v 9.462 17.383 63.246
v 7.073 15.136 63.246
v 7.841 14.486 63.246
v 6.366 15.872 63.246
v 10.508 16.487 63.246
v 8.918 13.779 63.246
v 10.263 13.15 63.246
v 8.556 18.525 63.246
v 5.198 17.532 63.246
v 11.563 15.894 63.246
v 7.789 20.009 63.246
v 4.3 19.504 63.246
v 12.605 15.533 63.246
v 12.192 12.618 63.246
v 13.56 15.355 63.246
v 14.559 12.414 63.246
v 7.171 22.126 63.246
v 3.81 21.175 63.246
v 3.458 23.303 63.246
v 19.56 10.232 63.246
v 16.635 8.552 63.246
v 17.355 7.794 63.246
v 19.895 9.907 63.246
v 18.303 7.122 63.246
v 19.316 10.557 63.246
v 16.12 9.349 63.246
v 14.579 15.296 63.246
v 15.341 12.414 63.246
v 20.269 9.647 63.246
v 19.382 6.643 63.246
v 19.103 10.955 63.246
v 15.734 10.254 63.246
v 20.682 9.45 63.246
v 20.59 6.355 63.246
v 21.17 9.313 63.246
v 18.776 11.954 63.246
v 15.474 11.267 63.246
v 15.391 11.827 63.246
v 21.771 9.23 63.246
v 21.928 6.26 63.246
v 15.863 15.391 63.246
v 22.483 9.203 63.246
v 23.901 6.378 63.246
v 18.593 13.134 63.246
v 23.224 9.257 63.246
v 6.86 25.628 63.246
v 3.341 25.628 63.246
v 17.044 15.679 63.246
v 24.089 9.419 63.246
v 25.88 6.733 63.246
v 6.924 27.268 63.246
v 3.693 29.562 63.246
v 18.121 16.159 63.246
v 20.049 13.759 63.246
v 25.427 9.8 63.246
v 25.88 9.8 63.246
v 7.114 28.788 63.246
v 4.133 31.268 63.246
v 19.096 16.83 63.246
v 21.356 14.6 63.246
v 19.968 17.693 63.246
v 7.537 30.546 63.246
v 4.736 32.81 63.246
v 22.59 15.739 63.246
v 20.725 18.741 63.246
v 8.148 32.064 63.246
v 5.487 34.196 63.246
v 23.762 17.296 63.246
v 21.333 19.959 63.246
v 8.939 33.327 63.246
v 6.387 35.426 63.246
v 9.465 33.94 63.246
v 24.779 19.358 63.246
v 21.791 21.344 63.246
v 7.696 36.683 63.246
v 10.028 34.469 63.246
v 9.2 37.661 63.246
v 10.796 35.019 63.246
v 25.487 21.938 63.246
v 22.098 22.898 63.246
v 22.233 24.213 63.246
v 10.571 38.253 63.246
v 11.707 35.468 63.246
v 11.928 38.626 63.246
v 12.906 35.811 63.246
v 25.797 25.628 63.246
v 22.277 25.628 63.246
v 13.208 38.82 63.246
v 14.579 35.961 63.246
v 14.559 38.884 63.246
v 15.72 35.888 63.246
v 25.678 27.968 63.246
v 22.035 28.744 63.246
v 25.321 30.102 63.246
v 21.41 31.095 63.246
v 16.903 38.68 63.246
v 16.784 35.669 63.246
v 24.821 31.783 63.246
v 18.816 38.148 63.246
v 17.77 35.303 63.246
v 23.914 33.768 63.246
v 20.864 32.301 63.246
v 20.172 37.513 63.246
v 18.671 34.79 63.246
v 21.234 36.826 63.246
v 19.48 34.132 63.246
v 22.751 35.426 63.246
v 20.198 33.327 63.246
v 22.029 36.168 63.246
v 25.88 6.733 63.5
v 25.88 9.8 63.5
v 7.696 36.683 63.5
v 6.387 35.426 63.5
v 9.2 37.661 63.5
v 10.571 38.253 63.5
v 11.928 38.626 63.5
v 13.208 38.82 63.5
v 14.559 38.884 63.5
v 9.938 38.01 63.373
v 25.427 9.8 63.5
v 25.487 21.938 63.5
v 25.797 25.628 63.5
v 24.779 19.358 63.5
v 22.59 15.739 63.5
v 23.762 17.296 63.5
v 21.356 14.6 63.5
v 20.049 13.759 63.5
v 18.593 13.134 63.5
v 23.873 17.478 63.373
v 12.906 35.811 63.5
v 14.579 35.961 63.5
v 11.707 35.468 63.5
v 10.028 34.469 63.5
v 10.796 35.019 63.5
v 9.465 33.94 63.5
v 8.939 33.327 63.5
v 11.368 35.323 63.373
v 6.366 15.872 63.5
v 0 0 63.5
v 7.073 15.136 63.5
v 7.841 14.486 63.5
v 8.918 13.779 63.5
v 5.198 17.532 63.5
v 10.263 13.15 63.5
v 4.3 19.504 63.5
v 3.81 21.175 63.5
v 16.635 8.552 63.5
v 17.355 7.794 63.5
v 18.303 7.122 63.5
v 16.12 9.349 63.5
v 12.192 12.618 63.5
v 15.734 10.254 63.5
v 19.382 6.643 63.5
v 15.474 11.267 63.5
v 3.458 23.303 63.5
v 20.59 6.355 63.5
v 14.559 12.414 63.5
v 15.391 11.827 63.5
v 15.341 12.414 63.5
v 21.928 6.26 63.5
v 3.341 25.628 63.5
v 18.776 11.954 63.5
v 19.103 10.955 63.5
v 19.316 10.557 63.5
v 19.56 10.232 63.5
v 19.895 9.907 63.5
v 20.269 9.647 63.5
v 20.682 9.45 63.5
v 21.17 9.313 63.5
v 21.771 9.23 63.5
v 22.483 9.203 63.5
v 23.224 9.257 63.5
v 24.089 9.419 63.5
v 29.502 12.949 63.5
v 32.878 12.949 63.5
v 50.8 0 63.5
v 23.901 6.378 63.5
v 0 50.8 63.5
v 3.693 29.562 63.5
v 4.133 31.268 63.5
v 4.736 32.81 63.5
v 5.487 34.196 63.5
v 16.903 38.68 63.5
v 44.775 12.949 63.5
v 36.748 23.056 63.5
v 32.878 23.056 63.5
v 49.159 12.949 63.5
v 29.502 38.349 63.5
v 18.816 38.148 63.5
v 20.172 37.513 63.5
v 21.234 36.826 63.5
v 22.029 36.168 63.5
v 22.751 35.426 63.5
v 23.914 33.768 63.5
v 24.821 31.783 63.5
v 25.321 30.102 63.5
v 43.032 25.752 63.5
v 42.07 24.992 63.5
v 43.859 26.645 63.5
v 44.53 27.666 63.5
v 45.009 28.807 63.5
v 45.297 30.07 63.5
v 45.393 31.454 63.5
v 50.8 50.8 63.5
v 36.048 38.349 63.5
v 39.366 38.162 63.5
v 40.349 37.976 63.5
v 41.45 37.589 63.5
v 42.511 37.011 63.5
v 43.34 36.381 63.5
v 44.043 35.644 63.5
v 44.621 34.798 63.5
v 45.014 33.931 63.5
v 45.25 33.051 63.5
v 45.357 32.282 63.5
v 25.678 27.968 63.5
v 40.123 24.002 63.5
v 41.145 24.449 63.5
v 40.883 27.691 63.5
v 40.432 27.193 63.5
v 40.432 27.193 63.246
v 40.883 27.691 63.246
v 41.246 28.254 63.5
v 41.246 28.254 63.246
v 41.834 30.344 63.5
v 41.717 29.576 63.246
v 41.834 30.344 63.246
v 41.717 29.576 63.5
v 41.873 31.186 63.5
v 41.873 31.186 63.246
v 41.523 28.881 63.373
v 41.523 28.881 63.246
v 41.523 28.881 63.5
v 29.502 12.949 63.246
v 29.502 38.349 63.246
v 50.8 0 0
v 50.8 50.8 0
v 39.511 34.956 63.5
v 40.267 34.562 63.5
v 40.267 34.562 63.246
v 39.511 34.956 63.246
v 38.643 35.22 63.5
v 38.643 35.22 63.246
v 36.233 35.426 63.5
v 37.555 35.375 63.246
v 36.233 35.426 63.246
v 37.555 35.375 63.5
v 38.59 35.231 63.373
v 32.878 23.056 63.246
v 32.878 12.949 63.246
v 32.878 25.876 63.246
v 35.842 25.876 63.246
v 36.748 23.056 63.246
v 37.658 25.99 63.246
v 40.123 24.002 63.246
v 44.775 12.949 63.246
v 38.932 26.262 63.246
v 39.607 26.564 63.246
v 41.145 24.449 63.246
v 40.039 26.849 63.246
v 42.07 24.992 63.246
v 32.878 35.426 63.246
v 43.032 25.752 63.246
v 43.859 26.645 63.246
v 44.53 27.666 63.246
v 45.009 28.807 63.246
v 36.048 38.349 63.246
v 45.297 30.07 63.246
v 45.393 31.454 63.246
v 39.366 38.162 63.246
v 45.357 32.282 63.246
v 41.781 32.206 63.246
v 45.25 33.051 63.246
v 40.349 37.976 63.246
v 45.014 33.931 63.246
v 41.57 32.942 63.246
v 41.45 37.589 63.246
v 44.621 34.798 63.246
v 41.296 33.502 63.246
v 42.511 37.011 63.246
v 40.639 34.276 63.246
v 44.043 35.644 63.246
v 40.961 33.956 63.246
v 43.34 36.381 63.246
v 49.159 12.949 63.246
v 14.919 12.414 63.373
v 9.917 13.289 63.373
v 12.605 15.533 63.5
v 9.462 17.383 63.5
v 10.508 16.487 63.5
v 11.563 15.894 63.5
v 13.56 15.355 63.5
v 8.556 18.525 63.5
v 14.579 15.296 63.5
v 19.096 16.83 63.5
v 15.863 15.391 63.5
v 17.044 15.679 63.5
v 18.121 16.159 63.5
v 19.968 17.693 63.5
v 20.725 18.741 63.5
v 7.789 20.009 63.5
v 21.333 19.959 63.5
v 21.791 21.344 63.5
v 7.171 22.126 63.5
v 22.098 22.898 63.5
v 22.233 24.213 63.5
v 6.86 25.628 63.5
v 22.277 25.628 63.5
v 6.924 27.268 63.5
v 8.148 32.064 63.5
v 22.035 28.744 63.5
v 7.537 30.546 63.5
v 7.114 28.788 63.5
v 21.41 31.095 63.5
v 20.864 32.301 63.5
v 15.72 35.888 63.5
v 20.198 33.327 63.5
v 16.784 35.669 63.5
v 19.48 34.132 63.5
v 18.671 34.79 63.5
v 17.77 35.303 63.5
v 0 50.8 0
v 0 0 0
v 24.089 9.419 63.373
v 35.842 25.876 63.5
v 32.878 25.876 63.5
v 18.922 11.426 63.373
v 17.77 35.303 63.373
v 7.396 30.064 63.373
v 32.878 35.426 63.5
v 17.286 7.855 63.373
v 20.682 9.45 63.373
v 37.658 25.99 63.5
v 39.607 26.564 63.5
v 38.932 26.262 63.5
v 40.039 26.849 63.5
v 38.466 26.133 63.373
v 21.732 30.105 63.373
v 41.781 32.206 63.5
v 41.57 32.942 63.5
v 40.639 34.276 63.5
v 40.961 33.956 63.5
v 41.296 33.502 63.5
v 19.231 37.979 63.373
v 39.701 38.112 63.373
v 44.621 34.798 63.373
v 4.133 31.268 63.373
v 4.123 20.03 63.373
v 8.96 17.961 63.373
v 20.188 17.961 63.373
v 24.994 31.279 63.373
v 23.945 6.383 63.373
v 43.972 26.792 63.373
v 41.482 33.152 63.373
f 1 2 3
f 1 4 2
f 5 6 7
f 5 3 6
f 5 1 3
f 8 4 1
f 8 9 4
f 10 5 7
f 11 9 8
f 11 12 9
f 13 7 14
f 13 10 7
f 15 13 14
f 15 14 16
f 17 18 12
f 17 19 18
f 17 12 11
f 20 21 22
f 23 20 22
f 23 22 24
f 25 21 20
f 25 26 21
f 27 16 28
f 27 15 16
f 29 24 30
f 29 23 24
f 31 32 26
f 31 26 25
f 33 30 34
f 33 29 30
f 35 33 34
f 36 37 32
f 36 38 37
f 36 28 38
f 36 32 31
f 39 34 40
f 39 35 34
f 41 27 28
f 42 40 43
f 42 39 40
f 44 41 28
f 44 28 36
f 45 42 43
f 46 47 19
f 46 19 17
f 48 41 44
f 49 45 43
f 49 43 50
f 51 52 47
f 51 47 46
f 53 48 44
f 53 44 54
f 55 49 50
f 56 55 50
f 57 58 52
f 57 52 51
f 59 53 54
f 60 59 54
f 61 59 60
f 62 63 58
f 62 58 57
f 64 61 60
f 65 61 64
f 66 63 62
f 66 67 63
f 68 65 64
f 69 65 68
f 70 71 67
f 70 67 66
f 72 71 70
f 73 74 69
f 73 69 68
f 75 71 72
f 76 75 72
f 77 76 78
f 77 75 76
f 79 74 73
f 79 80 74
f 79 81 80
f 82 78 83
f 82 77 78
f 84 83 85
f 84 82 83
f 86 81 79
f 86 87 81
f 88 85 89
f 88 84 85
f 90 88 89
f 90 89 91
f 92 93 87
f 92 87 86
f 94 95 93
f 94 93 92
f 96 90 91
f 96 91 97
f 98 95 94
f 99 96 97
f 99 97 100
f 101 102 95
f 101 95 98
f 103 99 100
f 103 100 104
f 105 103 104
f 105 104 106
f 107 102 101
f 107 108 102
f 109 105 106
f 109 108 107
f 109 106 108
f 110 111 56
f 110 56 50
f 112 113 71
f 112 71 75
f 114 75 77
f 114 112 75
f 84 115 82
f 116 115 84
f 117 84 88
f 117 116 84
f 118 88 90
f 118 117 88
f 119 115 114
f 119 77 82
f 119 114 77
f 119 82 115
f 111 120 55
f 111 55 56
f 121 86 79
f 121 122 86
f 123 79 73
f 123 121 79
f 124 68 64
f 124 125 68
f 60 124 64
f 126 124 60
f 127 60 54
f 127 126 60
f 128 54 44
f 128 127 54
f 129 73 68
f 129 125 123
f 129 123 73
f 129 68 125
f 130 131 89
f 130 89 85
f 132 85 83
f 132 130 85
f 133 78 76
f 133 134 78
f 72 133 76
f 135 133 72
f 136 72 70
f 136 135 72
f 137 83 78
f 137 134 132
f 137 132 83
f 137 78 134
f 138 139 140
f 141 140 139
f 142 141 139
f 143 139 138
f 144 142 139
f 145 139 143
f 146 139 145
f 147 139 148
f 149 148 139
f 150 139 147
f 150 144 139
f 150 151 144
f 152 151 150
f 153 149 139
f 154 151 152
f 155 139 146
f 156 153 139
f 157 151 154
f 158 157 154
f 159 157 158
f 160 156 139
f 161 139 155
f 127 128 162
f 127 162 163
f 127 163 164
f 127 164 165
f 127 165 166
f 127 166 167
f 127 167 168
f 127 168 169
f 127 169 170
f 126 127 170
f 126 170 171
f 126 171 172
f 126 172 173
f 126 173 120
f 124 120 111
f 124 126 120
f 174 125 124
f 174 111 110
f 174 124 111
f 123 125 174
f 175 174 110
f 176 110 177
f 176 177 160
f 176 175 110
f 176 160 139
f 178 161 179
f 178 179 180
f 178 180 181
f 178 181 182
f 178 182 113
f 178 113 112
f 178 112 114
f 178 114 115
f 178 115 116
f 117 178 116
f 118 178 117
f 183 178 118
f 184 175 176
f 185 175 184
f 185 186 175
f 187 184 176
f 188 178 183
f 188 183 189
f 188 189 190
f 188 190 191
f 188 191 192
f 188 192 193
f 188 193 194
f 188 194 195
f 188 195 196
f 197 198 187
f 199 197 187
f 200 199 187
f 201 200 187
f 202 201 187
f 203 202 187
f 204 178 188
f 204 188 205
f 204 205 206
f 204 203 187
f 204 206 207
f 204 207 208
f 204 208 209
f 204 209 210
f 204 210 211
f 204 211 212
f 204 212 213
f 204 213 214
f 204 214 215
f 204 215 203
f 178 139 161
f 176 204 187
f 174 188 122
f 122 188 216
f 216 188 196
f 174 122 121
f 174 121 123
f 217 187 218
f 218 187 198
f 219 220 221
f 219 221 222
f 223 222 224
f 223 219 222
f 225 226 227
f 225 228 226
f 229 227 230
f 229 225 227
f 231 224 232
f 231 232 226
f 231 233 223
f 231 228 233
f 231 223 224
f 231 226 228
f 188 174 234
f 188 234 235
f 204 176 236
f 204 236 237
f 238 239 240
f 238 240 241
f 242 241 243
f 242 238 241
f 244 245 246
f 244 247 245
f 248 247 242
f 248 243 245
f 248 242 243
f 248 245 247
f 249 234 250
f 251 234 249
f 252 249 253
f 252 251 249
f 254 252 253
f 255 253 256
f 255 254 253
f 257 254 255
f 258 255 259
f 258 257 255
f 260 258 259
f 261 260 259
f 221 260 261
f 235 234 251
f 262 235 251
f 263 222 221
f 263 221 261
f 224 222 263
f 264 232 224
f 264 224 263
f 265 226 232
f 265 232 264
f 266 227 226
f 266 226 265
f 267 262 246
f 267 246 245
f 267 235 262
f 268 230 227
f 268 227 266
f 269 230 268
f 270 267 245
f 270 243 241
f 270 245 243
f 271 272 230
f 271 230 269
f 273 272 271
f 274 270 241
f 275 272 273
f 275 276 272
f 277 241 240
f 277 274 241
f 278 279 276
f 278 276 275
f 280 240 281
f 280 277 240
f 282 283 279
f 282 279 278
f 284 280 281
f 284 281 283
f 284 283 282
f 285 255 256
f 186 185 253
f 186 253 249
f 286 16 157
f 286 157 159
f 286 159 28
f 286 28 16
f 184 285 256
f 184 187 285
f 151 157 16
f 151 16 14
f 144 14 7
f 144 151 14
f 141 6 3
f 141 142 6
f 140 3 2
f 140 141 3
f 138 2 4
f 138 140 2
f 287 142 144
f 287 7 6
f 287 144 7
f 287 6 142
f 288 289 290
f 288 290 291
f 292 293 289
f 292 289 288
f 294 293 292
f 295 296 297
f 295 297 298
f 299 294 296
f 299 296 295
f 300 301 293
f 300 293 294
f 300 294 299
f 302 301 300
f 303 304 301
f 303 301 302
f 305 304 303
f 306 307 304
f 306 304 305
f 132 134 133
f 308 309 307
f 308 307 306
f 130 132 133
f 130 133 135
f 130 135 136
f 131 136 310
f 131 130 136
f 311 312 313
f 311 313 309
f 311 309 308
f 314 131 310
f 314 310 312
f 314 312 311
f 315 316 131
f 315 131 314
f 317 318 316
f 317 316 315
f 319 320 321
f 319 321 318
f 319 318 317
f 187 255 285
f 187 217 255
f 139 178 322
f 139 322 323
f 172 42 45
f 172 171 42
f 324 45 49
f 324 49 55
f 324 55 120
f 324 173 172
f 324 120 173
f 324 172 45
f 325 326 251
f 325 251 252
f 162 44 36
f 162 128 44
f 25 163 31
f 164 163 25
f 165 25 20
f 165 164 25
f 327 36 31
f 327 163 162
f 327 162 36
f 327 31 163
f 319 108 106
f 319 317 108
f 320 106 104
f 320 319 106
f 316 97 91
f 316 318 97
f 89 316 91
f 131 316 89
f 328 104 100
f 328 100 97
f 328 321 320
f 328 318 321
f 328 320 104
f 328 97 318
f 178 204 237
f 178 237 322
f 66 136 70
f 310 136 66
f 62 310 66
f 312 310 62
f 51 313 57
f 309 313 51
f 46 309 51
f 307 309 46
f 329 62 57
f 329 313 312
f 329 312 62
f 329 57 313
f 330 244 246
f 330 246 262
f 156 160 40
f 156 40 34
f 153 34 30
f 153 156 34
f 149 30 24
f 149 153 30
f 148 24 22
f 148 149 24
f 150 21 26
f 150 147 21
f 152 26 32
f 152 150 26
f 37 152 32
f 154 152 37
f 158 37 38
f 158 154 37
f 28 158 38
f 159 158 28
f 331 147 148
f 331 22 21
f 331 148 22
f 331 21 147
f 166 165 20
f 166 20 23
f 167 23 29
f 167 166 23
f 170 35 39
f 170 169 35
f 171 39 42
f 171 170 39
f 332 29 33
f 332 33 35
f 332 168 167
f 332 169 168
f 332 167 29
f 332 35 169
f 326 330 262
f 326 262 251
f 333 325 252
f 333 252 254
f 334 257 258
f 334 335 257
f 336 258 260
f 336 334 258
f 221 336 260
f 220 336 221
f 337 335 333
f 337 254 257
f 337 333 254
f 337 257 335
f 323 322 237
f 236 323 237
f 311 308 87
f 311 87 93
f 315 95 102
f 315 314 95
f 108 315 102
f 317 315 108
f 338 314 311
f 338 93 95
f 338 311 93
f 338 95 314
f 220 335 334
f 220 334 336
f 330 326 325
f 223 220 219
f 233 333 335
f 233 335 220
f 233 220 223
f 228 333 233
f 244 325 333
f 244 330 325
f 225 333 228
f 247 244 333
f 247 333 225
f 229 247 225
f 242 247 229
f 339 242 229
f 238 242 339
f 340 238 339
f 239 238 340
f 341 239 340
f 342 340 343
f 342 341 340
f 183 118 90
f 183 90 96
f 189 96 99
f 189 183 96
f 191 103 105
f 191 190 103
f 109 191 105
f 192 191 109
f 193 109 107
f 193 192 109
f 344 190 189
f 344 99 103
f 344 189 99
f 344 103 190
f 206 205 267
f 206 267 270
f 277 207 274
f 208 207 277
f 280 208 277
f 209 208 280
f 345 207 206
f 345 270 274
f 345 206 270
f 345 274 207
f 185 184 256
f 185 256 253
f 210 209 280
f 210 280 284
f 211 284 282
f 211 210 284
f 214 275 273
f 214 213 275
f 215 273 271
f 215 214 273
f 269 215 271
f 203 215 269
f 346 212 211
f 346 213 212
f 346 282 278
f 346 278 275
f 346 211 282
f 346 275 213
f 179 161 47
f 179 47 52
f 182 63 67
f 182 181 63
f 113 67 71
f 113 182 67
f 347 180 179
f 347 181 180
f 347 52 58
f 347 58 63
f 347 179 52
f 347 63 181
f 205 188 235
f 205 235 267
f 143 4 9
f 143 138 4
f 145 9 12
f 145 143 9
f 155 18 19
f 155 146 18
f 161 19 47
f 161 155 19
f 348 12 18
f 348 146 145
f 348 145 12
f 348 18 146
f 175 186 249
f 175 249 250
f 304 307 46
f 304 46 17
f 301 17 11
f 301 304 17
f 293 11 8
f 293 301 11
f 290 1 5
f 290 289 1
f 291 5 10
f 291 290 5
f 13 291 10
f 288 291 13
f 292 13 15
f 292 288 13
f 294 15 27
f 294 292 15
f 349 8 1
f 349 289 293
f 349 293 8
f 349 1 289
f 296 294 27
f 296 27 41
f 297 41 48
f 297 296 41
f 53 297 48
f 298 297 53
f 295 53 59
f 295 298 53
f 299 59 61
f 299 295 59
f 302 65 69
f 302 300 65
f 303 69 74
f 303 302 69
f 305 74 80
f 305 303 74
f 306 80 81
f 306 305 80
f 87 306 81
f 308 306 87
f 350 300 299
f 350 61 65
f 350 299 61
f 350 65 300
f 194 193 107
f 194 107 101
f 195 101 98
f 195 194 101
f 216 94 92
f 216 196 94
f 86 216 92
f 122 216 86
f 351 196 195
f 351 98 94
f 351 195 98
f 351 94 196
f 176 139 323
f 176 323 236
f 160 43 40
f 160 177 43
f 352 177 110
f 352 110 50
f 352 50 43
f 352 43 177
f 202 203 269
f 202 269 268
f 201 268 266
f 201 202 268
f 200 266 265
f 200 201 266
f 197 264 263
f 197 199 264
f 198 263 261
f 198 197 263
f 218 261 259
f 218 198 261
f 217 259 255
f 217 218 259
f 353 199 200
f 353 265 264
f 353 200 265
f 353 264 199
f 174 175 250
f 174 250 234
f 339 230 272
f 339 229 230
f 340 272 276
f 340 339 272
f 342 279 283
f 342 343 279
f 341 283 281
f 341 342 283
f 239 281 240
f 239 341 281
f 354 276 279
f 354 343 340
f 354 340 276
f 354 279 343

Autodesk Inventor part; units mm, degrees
ref_plane "YZ Plane" through (0, 0, 0) normal (1, 0, 0) x (0, 1, 0)
ref_plane "XZ Plane" through (0, 0, 0) normal (0, 1, 0) x (-1, 0, 0)
ref_plane "XY Plane" through (0, 0, 0) normal (0, 0, 1) x (1, 0, 0)
sketch "Sketch1" plane through (0, 0, 0) normal (0, 0, 1) x (1, 0, 0)
  line L0 (0, 0) -> (50.8, 0)
  line L1 (50.8, 0) -> (50.8, 50.8)
  line L2 (50.8, 50.8) -> (0, 50.8)
  line L3 (0, 50.8) -> (0, 0)
  dimension "d0" = 50.8
  dimension "d1" = 50.8
extrude "Extrusion1" add sketch "Sketch1" along normal blind 63.5
sketch "Sketch2" plane through (0, 0, 63.5) normal (0, 0, 1) x (1, 0, 0)
  line L0 (2.2085, 38.8843) -> (25.4061, 38.8843) construction
  line L1 (25.4061, 38.8843) -> (25.4061, 22.5719) construction
  line L2 (25.4061, 22.5719) -> (2.2085, 22.5719) construction
  line L3 (2.2085, 22.5719) -> (2.2085, 38.8843) construction
  spline S0 degree 2 poles (25.8795, 6.7329) (24.9533, 6.5065) (22.9361, 6.2595) (21.9275, 6.2595) knots 0 0 0 1 2 2 2
  spline S1 degree 2 poles (21.9275, 6.2595) (19.0664, 6.2595) (15.5055, 9.4499) (15.3408, 12.4139) knots 0 0 0 1 2 2 2
  spline S2 degree 2 poles (15.3408, 12.4139) (15.1144, 12.4139) (14.7233, 12.4139) (14.5586, 12.4139) knots 0 0 0 1 2 2 2
  spline S3 degree 2 poles (14.5586, 12.4139) (11.9857, 12.4139) (7.8484, 14.1635) (6.3664, 15.872) knots 0 0 0 1 2 2 2
  spline S4 degree 2 poles (6.3664, 15.872) (4.905, 17.5598) (3.3406, 22.4998) (3.3406, 25.6285) knots 0 0 0 1 2 2 2
  spline S5 degree 2 poles (3.3406, 25.6285) (3.3406, 28.8396) (4.9256, 33.6973) (6.387, 35.4263) knots 0 0 0 1 2 2 2
  spline S6 degree 2 poles (6.387, 35.4263) (7.869, 37.1347) (12.0063, 38.8843) (14.5586, 38.8843) knots 0 0 0 1 2 2 2
  spline S7 degree 2 poles (14.5586, 38.8843) (17.1521, 38.8843) (21.31, 37.0729) (22.7508, 35.4263) knots 0 0 0 1 2 2 2
  spline S8 degree 2 poles (22.7508, 35.4263) (24.1917, 33.759) (25.7972, 28.7984) (25.7972, 25.6285) knots 0 0 0 1 2 2 2
  spline S9 degree 2 poles (25.7972, 25.6285) (25.7972, 20.6885) (21.9481, 14.2665) (18.593, 13.1344) knots 0 0 0 1 2 2 2
  spline S10 degree 2 poles (18.593, 13.1344) (18.6753, 12.1875) (19.1693, 10.6643) (19.5604, 10.2321) knots 0 0 0 1 2 2 2
  spline S11 degree 2 poles (19.5604, 10.2321) (20.0338, 9.6969) (21.3306, 9.2029) (22.4833, 9.2029) knots 0 0 0 1 2 2 2
  spline S12 degree 2 poles (22.4833, 9.2029) (23.1625, 9.2029) (25.015, 9.6352) (25.4267, 9.7998) knots 0 0 0 1 2 2 2
  line L4 (25.4267, 9.7998) -> (25.8795, 9.7998)
  line L5 (25.8795, 9.7998) -> (25.8795, 6.7329)
  spline S13 degree 2 poles (22.2774, 25.6285) (22.2774, 28.1603) (21.1865, 32.0506) (20.1985, 33.3267) knots 0 0 0 1 2 2 2
  spline S14 degree 2 poles (20.1985, 33.3267) (19.1899, 34.6441) (16.3494, 35.9614) (14.5792, 35.9614) knots 0 0 0 1 2 2 2
  spline S15 degree 2 poles (14.5792, 35.9614) (12.7473, 35.9614) (9.9891, 34.6853) (8.9393, 33.3267) knots 0 0 0 1 2 2 2
  spline S16 degree 2 poles (8.9393, 33.3267) (7.9308, 32.03) (6.8604, 28.0985) (6.8604, 25.6285) knots 0 0 0 1 2 2 2
  spline S17 degree 2 poles (6.8604, 25.6285) (6.8604, 20.6267) (11.0594, 15.2956) (14.5792, 15.2956) knots 0 0 0 1 2 2 2
  spline S18 degree 2 poles (14.5792, 15.2956) (18.099, 15.2956) (22.2774, 20.6267) (22.2774, 25.6285) knots 0 0 0 1 2 2 2
  line L6 (49.1594, 12.9491) -> (44.7752, 12.9491)
  line L7 (44.7752, 12.9491) -> (36.7476, 23.0556)
  line L8 (36.7476, 23.0556) -> (32.8779, 23.0556)
  line L9 (32.8779, 23.0556) -> (32.8779, 12.9491)
  line L10 (32.8779, 12.9491) -> (29.5022, 12.9491)
  line L11 (29.5022, 12.9491) -> (29.5022, 38.3491)
  line L12 (29.5022, 38.3491) -> (36.0478, 38.3491)
  spline S19 degree 2 poles (36.0478, 38.3491) (38.2296, 38.3491) (41.1731, 37.8757) (42.511, 37.0112) knots 0 0 0 1 2 2 2
  spline S20 degree 2 poles (42.511, 37.0112) (43.8489, 36.1467) (45.3927, 33.4502) (45.3927, 31.4537) knots 0 0 0 1 2 2 2
  spline S21 degree 2 poles (45.3927, 31.4537) (45.3927, 28.6749) (42.5521, 24.9081) (40.1233, 24.0024) knots 0 0 0 1 2 2 2
  line L13 (40.1233, 24.0024) -> (49.1594, 12.9491)
  spline S22 degree 2 poles (41.8729, 31.1861) (41.8729, 32.2976) (41.0907, 34.006) (40.2674, 34.5618) knots 0 0 0 1 2 2 2
  spline S23 degree 2 poles (40.2674, 34.5618) (39.547, 35.0352) (37.6327, 35.4263) (36.233, 35.4263) knots 0 0 0 1 2 2 2
  line L14 (36.233, 35.4263) -> (32.8779, 35.4263)
  line L15 (32.8779, 35.4263) -> (32.8779, 25.8755)
  line L16 (32.8779, 25.8755) -> (35.8419, 25.8755)
  spline S24 degree 2 poles (35.8419, 25.8755) (37.3034, 25.8755) (39.6293, 26.3901) (40.432, 27.1929) knots 0 0 0 1 2 2 2
  spline S25 degree 2 poles (40.432, 27.1929) (41.1731, 27.8927) (41.8729, 29.8687) (41.8729, 31.1861) knots 0 0 0 1 2 2 2
  point P0 (0, 0)
extrude "Extrusion2" cut sketch "Sketch2" against normal blind 0.254
equation "\"d1\" = d0"
properties part number "Container 2 2 2 and half color 7"
